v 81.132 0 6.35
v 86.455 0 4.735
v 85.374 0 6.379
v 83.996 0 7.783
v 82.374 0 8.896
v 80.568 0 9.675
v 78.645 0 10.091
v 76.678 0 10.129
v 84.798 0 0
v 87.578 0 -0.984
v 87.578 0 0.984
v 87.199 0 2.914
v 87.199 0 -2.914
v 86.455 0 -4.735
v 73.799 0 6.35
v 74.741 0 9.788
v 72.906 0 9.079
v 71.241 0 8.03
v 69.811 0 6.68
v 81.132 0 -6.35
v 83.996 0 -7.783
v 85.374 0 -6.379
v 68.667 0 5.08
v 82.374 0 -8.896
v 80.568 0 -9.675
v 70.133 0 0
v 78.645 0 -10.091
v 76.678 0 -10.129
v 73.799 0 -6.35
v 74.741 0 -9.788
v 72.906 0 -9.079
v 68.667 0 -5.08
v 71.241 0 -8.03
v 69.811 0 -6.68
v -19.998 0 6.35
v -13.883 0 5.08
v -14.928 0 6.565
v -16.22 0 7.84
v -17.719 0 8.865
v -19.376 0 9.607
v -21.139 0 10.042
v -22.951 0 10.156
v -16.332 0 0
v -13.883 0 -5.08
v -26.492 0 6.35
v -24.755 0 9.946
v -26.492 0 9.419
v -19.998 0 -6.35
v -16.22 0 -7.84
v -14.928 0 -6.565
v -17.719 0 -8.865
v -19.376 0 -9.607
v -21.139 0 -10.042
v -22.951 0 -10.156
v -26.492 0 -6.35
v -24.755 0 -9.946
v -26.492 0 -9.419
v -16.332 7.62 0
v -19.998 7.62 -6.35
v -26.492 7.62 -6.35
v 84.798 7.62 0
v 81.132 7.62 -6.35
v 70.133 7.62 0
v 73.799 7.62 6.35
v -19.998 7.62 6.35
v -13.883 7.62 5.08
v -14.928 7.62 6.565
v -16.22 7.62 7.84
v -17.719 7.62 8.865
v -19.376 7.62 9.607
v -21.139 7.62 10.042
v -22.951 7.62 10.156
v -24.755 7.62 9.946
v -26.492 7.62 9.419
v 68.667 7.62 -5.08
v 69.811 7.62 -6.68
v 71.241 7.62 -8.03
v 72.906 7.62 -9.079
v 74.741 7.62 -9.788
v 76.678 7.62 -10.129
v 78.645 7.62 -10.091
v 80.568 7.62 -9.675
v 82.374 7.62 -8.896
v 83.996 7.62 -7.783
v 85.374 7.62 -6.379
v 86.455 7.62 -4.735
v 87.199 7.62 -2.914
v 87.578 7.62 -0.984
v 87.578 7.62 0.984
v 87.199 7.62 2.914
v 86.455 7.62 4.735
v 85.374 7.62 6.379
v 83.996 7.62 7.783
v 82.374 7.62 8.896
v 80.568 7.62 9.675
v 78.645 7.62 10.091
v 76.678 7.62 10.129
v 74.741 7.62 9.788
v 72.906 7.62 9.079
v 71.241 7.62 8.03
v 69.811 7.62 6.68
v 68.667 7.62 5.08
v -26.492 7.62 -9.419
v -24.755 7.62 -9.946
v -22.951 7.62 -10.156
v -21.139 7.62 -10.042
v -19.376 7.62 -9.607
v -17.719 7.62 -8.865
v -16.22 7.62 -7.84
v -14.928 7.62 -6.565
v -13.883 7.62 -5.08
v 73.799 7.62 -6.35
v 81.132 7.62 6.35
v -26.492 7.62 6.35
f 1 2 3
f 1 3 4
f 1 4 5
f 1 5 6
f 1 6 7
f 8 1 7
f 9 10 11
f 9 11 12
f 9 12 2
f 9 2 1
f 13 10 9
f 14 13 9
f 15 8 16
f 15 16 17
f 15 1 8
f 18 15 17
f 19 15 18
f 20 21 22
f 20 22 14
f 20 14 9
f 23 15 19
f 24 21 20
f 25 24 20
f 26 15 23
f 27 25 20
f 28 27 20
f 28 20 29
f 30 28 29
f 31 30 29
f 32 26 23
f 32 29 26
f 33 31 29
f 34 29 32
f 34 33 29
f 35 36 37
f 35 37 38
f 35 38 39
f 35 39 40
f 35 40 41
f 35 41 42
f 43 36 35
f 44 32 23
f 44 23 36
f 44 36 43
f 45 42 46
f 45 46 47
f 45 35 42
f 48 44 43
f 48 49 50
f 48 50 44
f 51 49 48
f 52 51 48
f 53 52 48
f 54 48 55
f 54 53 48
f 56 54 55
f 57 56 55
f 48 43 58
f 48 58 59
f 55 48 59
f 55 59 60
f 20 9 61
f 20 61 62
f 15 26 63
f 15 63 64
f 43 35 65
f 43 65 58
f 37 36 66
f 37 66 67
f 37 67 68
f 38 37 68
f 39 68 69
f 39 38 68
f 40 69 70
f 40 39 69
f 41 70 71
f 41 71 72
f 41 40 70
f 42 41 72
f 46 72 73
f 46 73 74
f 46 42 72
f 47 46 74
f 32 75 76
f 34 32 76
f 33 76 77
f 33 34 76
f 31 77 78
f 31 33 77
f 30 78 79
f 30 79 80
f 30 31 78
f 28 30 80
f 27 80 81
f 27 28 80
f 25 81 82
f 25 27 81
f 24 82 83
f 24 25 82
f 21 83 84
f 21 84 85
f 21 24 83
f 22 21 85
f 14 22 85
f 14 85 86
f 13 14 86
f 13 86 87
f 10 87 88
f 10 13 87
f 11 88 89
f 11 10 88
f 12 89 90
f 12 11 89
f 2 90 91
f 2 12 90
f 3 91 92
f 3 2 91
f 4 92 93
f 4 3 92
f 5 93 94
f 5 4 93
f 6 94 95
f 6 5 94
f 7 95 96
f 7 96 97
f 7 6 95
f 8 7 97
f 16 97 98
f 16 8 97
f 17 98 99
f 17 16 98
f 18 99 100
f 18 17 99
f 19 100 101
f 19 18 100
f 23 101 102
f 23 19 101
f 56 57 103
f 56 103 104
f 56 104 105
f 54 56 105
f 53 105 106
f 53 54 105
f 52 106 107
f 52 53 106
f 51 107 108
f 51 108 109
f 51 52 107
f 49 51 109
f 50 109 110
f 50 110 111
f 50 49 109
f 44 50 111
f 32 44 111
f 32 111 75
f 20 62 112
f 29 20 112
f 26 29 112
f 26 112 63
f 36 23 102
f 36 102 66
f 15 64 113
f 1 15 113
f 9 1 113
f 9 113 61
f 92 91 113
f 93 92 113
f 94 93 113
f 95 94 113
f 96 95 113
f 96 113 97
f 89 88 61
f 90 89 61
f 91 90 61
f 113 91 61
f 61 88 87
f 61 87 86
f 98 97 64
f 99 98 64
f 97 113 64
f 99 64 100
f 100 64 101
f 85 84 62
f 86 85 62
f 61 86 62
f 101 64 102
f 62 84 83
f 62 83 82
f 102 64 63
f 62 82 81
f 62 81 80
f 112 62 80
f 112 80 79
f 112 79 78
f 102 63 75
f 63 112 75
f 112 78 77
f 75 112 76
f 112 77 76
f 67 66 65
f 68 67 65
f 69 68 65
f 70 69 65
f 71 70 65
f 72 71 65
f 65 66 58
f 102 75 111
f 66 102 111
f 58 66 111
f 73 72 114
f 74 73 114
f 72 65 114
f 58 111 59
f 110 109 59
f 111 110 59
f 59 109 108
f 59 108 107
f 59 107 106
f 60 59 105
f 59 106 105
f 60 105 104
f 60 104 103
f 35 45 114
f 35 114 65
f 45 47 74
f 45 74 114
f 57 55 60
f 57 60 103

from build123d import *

# Parameters (mm, degrees)
BOSS_EXTRUDE1_DEPTH = 7.62


with BuildPart() as part:
    # Sketch1 → Boss-Extrude1 (new body)
    with BuildSketch(Plane(origin=(0, 0, 0), x_dir=(1, 0, 0), z_dir=(0, 1, 0))):
        with BuildLine():
            Line((-13.883314172, 5.08), (68.666685828, 5.08))
            ThreePointArc((68.666685828, 5.08), (87.62550393, 0), (68.666685828, -5.08))
            Line((68.666685828, -5.08), (-13.883314172, -5.08))
            ThreePointArc((-13.883314172, -5.08), (-19.3763981, -9.60717032), (-26.492132275, -9.418572079))
            Line((-26.492132275, -9.418572079), (-26.492132275, -6.35))
            Line((-26.492132275, -6.35), (-19.998306484, -6.35))
            Line((-19.998306484, -6.35), (-16.332132275, 0))
            Line((-16.332132275, 0), (-19.998306484, 6.35))
            Line((-19.998306484, 6.35), (-26.492132275, 6.35))
            Line((-26.492132275, 6.35), (-26.492132275, 9.418572079))
            ThreePointArc((-26.492132275, 9.418572079), (-19.3763981, 9.60717032), (-13.883314172, 5.08))
        make_face()
        Polygon((70.133155511, 0), (73.799329721, -6.35), (81.131678139, -6.35), (84.797852349, 0), (81.131678139, 6.35), (73.799329721, 6.35), align=None, mode=Mode.SUBTRACT)
    extrude(amount=BOSS_EXTRUDE1_DEPTH)


solid = part.part
